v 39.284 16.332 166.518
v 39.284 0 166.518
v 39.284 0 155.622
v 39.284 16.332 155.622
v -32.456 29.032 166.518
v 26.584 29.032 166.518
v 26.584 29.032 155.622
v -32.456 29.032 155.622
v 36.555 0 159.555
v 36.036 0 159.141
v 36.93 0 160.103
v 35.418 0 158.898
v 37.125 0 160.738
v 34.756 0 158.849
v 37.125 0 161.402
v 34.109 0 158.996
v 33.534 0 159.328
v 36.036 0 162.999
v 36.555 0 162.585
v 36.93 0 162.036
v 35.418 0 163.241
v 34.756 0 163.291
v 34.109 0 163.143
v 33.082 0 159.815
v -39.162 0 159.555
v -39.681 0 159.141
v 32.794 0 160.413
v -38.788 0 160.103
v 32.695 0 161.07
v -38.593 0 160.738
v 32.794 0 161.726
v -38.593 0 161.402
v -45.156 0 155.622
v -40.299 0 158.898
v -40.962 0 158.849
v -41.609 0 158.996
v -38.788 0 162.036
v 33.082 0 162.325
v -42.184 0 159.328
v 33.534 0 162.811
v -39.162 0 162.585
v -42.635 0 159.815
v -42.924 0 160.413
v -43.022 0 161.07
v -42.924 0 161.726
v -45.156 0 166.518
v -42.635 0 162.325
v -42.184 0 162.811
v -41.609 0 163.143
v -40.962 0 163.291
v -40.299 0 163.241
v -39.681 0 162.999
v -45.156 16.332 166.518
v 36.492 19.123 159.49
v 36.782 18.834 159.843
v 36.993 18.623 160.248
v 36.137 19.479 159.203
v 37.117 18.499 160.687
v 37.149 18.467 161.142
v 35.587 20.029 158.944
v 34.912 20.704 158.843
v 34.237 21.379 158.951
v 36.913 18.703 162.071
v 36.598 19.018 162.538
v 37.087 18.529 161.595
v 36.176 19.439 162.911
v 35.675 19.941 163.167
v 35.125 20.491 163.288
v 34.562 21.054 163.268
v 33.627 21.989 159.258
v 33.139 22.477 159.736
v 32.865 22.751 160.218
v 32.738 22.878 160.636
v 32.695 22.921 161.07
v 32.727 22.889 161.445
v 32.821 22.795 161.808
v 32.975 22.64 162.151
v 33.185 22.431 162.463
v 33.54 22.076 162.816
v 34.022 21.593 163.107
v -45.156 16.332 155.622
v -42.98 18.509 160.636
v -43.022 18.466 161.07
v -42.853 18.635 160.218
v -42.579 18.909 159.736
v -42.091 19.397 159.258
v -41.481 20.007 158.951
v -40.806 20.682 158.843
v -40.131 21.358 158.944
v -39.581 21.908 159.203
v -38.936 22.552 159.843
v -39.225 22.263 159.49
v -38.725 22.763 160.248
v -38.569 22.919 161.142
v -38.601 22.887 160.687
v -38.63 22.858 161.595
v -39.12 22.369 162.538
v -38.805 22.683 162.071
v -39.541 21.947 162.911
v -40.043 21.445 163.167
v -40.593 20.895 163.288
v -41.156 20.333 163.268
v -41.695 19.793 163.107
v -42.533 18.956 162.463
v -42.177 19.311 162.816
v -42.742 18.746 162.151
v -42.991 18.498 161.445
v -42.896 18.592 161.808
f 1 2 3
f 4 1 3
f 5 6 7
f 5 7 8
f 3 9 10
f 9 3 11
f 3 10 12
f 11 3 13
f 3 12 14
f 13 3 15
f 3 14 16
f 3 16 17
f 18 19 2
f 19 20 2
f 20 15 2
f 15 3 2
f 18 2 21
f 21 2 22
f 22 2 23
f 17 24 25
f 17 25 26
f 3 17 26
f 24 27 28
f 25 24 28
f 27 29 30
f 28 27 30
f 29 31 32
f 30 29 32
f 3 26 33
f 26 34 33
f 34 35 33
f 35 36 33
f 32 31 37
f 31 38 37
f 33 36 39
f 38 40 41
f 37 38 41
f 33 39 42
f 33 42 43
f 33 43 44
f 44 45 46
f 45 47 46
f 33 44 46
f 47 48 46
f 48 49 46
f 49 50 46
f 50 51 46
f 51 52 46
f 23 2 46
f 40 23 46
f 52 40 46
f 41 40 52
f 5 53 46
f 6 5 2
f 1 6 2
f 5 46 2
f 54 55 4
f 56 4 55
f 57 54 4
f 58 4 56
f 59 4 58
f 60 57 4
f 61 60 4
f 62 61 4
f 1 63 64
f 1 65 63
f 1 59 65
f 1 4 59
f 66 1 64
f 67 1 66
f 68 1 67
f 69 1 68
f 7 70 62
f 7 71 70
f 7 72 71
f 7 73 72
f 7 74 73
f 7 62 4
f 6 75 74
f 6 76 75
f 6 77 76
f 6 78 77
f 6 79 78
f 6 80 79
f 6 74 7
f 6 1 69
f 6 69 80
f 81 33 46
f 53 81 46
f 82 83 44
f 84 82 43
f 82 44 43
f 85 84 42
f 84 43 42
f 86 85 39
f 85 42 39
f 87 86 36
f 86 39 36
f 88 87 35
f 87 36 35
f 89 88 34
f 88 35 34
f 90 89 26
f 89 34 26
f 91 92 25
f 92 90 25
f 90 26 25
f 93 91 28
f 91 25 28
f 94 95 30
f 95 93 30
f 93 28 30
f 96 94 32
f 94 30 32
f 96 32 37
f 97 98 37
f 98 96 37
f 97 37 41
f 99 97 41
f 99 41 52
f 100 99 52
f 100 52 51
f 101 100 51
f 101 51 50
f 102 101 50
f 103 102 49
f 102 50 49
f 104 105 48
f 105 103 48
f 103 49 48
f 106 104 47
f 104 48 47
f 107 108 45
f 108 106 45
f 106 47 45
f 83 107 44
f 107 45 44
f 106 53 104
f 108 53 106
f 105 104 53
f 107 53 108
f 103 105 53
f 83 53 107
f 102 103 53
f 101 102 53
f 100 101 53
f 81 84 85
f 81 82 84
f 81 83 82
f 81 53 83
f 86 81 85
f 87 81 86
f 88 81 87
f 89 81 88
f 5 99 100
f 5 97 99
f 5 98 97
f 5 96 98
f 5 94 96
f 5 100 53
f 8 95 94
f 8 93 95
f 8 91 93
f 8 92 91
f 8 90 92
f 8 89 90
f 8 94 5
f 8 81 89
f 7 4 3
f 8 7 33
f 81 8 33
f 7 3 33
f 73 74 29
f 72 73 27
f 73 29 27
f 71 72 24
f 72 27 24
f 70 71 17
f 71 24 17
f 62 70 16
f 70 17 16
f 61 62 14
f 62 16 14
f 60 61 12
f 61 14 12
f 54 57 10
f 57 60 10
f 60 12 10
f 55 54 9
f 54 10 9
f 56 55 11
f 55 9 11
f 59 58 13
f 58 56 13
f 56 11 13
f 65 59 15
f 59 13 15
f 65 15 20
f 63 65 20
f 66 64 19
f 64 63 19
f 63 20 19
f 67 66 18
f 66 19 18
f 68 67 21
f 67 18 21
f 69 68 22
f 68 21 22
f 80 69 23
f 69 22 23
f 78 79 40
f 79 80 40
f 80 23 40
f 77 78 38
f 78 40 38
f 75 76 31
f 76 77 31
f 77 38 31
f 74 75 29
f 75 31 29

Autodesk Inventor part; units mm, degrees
ref_plane "YZ Plane" through (0, 0, 0) normal (1, 0, 0) x (0, 1, 0)
ref_plane "XZ Plane" through (0, 0, 0) normal (0, 1, 0) x (-1, 0, 0)
ref_plane "XY Plane" through (0, 0, 0) normal (0, 0, 1) x (1, 0, 0)
sketch "Sketch1" plane through (0, 0, 0) normal (0, 1, 0) x (-1, 0, 0)
  line L0 (-39.2837, 182.0907) -> (45.1561, 182.0907)
  line L1 (45.1561, 182.0907) -> (45.1561, 192.9873)
  line L2 (-39.2837, 192.9873) -> (-39.2837, 182.0907)
  circle A0 centre (40.7951, 187.539) radius 2.2274
  circle A1 centre (-34.9227, 187.539) radius 2.2274
  line L3 (52.1157, -152.8547) -> (52.1157, 254.4851) construction
  line L4 (-39.2837, 182.0907) -> (45.1561, 182.0907) construction
  line L5 (45.1561, 182.0907) -> (45.1561, 192.9873) construction
  line L6 (45.1561, 192.9873) -> (-39.2837, 192.9873)
  line L7 (-39.2837, 192.9873) -> (-39.2837, 182.0907) construction
  circle A2 centre (40.7951, 187.539) radius 2.2274
  circle A3 centre (-34.9227, 187.539) radius 2.2274
  line L8 (-47.9603, 254.4851) -> (-47.9603, -152.8547) construction
  line L9 (45.1561, 166.5182) -> (-39.2837, 166.5182)
  line L10 (-39.2837, 166.5182) -> (-39.2837, 155.6216)
  line L11 (-39.2837, 155.6216) -> (45.1561, 155.6216)
  line L12 (45.1561, 155.6216) -> (45.1561, 166.5182)
  circle A4 centre (40.7951, 161.0699) radius 2.2274
  circle A5 centre (-34.9227, 161.0699) radius 2.2274
  point P0 (0, 0)
  point P1 (0, 0)
  point P2 (0, 0)
  dimension "d0" = 84.4398
  dimension "d1" = 10.8966
  dimension "d3" = 2.1336
  dimension "d4" = 2.1336
  dimension "d5" = 6.9596
  dimension "d6" = 84.4398
  dimension "d7" = 10.8966
  dimension "d9" = 2.1336
  dimension "d10" = 2.1336
  dimension "d14" = 10.8966
  dimension "d15" = 3.2209
  dimension "d16" = 3.2209
  dimension "d17" = 2.1336
  dimension "d18" = 2.1336
  dimension "d19" = 3.2209
  dimension "d20" = 3.2209
  dimension "d21" = 75.7178
  dimension "d22" = 75.7178
  dimension "d23" = 84.4398
extrude "Extrusion1" add sketch "Sketch1" along normal blind 29.0322 contours L12 L11 L10 L9
chamfer "Chamfer1" distance 12.7 angle 45 2 edges at (39.2837, 29.0322, 161.0699) (-45.1561, 29.0322, 161.0699)
equation "\"d4\" = d3"
equation "\"d10\" = d9"
equation "\"d14\" = d7"
equation "\"d17\" = d9"
equation "\"d18\" = d10"
equation "\"d19\" = d15"
equation "\"d20\" = d16"
properties part number "Voltage Divider (Rough)"
